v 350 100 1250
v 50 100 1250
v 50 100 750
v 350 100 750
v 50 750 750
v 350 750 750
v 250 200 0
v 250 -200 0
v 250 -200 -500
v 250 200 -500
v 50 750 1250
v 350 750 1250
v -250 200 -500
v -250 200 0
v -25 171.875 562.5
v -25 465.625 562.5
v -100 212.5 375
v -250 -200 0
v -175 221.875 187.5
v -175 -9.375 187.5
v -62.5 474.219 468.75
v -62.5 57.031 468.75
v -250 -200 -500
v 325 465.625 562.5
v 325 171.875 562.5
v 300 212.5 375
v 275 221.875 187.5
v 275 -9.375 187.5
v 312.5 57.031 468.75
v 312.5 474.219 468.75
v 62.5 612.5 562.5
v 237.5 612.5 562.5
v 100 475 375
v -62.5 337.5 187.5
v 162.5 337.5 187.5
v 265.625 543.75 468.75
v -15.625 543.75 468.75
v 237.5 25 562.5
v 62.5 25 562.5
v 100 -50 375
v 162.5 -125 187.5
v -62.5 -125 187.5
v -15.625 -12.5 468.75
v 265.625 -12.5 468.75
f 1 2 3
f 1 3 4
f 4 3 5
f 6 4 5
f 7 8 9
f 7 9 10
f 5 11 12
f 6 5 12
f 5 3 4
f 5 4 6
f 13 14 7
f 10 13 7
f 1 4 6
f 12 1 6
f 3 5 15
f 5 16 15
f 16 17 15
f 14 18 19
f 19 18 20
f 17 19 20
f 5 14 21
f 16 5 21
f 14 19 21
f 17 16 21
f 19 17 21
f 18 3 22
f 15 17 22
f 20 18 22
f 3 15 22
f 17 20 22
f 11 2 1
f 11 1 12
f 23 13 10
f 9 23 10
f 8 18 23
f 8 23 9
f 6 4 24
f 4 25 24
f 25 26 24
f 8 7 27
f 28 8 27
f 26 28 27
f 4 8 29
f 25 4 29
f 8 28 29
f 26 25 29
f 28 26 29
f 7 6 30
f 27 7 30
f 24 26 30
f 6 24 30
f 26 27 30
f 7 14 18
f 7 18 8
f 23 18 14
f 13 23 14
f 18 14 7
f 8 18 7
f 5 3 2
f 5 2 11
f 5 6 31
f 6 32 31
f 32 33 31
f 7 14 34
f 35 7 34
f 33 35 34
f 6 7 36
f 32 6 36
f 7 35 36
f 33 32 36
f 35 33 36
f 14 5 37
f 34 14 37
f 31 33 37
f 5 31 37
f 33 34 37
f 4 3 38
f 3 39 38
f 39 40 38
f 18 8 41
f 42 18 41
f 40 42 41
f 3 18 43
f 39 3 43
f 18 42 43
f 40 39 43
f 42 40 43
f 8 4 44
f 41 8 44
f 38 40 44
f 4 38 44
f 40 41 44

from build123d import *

# Parameters (mm, degrees)
F2_W     = 300
F2_H     = 650
F0_W     = 500
F0_H     = 400
F4_DEPTH = 500
F5_DEPTH = 500


with BuildPart() as f3:
    # F2 (on offset) → F3 section 0
    with BuildSketch(Plane.XY.offset(750)):
        with Locations((200, 425)):
            Rectangle(F2_W, F2_H)
    # F0 (on Top) → F3 section 1
    with BuildSketch(Plane.XY):
        Rectangle(F0_W, F0_H)
    loft()


with BuildPart() as f4:
    # F4 (new): a face of the model
    f4_faces = [f3.part.faces().sort_by_distance(p)[0] for p in [
        (0, 0, 0),
    ]]
    extrude(f4_faces, amount=F4_DEPTH)


with BuildPart() as f5:
    # F5 (new): a face of the model
    f5_faces = [f3.part.faces().sort_by_distance(p)[0] for p in [
        (200, 425, 750),
    ]]
    extrude(f5_faces, amount=F5_DEPTH)


solid = Compound([f3.part, f4.part, f5.part])
